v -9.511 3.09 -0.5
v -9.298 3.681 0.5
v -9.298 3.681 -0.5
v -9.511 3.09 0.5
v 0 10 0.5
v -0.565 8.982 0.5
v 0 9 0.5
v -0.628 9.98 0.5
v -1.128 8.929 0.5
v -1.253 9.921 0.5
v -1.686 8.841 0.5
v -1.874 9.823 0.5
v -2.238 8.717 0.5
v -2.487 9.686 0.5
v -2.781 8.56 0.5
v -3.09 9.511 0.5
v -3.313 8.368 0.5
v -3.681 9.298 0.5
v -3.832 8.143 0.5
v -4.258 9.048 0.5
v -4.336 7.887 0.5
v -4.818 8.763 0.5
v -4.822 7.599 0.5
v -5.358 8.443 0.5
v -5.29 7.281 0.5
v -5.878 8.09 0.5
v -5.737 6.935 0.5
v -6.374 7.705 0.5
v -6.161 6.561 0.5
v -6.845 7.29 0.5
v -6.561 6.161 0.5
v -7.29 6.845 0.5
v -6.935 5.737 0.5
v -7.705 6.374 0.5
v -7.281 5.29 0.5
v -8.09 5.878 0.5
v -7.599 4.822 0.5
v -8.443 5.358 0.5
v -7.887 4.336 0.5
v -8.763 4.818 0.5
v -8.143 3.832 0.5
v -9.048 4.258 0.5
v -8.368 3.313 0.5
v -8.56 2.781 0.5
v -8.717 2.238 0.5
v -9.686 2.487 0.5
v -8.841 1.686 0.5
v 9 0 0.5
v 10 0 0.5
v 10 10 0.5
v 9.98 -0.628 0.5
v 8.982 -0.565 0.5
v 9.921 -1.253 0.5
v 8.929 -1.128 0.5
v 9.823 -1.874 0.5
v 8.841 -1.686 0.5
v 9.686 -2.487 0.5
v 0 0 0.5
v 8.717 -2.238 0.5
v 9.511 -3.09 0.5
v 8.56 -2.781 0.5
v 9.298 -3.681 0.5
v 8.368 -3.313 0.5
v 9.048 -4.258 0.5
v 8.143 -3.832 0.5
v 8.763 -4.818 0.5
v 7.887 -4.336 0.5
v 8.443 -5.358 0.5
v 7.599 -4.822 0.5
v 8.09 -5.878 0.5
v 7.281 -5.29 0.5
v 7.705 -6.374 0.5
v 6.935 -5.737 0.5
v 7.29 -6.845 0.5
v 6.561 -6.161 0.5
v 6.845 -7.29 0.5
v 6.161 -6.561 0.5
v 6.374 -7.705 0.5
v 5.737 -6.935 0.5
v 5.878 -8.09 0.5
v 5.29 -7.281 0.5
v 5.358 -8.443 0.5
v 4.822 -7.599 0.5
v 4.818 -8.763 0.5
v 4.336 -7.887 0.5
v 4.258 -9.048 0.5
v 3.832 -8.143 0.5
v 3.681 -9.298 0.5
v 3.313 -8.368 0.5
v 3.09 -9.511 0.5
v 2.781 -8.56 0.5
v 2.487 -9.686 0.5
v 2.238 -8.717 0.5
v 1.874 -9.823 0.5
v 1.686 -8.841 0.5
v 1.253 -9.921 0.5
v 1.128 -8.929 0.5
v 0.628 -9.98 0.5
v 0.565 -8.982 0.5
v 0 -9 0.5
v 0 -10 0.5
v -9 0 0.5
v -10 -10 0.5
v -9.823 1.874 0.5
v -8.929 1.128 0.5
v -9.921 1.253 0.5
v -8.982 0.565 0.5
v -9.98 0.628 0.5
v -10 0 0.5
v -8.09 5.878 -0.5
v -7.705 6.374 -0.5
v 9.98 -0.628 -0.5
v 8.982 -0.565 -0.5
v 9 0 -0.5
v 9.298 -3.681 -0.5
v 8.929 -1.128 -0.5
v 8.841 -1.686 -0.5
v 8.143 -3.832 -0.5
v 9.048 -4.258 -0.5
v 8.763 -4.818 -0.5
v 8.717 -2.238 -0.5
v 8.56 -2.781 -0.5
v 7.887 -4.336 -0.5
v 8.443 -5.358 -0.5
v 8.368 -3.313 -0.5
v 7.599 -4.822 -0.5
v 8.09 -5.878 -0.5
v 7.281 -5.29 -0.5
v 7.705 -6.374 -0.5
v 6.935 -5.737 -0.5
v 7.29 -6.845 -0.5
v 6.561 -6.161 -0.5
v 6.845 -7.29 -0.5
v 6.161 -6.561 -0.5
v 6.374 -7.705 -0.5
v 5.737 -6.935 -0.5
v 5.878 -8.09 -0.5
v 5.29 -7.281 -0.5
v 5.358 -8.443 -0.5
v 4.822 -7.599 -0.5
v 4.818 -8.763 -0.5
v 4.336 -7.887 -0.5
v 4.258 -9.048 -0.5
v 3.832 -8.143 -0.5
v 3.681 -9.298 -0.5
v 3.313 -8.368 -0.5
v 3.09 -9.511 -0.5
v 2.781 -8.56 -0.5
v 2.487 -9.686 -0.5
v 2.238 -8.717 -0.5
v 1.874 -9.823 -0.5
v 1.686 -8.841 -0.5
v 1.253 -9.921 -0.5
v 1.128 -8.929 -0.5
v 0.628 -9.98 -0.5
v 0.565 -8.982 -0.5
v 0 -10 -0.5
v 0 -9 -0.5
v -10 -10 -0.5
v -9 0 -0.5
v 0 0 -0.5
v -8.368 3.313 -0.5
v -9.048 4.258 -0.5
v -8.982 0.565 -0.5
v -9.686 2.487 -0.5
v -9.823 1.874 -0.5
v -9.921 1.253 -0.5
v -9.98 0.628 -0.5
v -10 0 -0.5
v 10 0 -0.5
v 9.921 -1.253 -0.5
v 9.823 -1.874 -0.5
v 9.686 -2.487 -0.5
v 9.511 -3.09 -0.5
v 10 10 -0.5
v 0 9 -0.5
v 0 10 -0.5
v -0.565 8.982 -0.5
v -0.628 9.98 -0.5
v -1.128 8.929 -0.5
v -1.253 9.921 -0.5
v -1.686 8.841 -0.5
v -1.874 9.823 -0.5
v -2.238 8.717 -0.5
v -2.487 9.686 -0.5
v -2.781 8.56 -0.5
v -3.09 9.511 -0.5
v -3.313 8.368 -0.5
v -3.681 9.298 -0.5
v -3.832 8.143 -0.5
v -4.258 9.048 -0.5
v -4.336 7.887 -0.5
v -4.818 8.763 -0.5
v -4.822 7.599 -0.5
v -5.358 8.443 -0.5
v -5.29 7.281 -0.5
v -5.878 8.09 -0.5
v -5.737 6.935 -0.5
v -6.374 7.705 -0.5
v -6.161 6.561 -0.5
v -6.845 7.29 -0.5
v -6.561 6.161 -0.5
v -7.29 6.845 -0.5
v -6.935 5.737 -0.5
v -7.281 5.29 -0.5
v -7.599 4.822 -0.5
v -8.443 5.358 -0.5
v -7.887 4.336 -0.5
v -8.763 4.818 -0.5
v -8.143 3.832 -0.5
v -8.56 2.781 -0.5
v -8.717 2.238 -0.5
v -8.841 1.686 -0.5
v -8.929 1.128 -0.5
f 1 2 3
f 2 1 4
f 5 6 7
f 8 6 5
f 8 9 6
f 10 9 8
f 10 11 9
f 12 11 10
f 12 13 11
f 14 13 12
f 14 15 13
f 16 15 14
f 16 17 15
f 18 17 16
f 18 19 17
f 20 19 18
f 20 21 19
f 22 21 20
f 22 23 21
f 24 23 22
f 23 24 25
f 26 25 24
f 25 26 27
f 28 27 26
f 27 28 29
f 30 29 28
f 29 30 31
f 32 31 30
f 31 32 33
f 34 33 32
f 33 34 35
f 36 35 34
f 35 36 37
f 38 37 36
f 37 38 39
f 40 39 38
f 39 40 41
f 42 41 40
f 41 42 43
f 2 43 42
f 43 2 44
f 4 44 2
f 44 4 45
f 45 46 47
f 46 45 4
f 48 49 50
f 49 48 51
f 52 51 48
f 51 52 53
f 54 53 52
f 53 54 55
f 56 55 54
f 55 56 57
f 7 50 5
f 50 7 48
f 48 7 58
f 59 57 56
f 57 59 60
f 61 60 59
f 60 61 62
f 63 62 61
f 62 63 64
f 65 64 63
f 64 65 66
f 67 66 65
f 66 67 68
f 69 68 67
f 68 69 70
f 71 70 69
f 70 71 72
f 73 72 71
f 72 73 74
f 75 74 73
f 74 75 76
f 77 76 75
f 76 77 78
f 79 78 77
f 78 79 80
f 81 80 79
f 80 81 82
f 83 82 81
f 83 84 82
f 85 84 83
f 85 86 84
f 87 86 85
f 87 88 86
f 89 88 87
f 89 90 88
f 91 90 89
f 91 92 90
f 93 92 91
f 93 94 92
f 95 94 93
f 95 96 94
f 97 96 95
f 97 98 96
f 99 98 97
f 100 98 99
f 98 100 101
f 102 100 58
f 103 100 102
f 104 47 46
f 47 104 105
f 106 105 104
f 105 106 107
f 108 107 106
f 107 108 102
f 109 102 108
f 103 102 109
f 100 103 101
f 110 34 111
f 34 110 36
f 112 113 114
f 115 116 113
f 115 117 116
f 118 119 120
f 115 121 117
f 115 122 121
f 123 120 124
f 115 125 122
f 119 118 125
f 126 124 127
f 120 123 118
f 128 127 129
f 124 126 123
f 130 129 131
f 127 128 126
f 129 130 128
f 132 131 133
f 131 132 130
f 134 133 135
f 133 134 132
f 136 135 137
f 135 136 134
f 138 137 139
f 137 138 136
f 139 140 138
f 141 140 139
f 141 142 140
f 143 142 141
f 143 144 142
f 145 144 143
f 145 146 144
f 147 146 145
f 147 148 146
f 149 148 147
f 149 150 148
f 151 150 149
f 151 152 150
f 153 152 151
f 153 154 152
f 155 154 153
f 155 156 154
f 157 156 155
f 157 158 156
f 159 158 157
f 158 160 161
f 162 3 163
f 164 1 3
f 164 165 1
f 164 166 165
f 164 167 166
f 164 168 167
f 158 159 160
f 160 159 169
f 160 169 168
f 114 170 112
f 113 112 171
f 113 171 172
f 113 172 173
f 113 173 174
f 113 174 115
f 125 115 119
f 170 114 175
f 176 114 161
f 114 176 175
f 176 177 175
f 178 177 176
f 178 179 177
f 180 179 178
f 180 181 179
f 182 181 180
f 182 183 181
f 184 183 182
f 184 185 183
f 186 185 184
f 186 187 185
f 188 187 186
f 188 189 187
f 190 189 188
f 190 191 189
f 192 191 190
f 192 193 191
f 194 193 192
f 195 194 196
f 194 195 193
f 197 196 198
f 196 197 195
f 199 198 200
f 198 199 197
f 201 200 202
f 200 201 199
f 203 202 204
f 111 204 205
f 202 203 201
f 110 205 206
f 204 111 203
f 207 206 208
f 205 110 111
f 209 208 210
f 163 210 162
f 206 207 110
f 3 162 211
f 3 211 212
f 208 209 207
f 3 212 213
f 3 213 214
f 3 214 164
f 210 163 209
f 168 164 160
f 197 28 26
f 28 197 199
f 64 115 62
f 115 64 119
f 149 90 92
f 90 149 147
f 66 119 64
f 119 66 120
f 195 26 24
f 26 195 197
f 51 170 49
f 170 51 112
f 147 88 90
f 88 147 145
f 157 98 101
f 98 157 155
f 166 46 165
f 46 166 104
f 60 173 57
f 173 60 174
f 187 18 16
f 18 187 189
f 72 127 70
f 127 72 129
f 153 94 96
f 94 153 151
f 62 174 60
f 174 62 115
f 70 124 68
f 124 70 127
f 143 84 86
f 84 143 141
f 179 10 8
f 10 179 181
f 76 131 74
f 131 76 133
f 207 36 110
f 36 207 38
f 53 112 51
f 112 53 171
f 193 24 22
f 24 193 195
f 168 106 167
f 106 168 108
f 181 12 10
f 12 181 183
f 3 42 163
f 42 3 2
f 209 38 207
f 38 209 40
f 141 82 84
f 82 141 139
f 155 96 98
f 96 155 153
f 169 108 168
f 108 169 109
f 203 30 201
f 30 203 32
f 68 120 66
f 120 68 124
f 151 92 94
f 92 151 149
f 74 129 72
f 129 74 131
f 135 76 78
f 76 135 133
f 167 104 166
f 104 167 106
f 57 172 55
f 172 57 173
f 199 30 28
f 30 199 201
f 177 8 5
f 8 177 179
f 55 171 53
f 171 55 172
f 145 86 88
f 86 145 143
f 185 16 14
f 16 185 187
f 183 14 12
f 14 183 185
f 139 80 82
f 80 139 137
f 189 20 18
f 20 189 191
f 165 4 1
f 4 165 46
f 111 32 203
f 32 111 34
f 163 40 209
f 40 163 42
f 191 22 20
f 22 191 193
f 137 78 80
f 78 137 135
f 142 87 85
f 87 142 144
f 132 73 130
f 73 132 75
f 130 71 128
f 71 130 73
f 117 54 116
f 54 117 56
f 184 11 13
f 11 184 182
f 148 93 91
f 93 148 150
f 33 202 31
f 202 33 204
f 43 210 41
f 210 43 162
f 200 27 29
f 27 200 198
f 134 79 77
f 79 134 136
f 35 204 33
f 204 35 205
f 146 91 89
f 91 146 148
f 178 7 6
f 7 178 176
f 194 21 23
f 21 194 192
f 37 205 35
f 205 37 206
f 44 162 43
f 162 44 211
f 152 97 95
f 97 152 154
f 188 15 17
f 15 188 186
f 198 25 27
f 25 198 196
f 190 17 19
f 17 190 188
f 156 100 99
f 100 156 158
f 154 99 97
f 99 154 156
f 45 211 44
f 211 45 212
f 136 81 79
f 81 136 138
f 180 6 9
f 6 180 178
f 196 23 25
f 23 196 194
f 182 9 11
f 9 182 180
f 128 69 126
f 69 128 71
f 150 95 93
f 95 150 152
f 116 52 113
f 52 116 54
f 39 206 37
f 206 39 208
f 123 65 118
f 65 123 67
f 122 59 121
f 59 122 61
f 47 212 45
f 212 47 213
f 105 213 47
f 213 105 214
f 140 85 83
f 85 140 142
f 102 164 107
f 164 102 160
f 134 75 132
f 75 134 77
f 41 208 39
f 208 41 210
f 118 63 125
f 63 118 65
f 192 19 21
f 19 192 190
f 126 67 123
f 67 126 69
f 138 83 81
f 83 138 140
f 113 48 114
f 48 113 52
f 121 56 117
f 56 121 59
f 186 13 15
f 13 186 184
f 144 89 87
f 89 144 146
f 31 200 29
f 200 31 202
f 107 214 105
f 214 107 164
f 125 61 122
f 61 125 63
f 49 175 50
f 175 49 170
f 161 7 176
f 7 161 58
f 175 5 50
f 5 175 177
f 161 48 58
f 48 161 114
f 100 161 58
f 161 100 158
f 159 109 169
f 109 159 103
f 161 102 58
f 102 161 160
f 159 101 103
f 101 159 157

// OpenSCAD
fid_size = 10;
fid_thk = 1;
fid = [fid_size, fid_size, fid_thk];
fudge = 0.1;

module fiducial(posn=[0,0,0]) {
  translate(posn) {
    translate([+0.5*fid.x, +0.5*fid.y, 0])
      cube( fid, center=true );
    translate([-0.5*fid.x, -0.5*fid.y, 0])
      cube( fid, center=true );
    difference() {
      cylinder(r=fid_size, h=fid_thk, center=true, $fn = 100);
      cylinder(r=fid_size-fid_thk, h=fid_thk+fudge, center=true, $fn = 100);
    }
  }
}

fiducial();
